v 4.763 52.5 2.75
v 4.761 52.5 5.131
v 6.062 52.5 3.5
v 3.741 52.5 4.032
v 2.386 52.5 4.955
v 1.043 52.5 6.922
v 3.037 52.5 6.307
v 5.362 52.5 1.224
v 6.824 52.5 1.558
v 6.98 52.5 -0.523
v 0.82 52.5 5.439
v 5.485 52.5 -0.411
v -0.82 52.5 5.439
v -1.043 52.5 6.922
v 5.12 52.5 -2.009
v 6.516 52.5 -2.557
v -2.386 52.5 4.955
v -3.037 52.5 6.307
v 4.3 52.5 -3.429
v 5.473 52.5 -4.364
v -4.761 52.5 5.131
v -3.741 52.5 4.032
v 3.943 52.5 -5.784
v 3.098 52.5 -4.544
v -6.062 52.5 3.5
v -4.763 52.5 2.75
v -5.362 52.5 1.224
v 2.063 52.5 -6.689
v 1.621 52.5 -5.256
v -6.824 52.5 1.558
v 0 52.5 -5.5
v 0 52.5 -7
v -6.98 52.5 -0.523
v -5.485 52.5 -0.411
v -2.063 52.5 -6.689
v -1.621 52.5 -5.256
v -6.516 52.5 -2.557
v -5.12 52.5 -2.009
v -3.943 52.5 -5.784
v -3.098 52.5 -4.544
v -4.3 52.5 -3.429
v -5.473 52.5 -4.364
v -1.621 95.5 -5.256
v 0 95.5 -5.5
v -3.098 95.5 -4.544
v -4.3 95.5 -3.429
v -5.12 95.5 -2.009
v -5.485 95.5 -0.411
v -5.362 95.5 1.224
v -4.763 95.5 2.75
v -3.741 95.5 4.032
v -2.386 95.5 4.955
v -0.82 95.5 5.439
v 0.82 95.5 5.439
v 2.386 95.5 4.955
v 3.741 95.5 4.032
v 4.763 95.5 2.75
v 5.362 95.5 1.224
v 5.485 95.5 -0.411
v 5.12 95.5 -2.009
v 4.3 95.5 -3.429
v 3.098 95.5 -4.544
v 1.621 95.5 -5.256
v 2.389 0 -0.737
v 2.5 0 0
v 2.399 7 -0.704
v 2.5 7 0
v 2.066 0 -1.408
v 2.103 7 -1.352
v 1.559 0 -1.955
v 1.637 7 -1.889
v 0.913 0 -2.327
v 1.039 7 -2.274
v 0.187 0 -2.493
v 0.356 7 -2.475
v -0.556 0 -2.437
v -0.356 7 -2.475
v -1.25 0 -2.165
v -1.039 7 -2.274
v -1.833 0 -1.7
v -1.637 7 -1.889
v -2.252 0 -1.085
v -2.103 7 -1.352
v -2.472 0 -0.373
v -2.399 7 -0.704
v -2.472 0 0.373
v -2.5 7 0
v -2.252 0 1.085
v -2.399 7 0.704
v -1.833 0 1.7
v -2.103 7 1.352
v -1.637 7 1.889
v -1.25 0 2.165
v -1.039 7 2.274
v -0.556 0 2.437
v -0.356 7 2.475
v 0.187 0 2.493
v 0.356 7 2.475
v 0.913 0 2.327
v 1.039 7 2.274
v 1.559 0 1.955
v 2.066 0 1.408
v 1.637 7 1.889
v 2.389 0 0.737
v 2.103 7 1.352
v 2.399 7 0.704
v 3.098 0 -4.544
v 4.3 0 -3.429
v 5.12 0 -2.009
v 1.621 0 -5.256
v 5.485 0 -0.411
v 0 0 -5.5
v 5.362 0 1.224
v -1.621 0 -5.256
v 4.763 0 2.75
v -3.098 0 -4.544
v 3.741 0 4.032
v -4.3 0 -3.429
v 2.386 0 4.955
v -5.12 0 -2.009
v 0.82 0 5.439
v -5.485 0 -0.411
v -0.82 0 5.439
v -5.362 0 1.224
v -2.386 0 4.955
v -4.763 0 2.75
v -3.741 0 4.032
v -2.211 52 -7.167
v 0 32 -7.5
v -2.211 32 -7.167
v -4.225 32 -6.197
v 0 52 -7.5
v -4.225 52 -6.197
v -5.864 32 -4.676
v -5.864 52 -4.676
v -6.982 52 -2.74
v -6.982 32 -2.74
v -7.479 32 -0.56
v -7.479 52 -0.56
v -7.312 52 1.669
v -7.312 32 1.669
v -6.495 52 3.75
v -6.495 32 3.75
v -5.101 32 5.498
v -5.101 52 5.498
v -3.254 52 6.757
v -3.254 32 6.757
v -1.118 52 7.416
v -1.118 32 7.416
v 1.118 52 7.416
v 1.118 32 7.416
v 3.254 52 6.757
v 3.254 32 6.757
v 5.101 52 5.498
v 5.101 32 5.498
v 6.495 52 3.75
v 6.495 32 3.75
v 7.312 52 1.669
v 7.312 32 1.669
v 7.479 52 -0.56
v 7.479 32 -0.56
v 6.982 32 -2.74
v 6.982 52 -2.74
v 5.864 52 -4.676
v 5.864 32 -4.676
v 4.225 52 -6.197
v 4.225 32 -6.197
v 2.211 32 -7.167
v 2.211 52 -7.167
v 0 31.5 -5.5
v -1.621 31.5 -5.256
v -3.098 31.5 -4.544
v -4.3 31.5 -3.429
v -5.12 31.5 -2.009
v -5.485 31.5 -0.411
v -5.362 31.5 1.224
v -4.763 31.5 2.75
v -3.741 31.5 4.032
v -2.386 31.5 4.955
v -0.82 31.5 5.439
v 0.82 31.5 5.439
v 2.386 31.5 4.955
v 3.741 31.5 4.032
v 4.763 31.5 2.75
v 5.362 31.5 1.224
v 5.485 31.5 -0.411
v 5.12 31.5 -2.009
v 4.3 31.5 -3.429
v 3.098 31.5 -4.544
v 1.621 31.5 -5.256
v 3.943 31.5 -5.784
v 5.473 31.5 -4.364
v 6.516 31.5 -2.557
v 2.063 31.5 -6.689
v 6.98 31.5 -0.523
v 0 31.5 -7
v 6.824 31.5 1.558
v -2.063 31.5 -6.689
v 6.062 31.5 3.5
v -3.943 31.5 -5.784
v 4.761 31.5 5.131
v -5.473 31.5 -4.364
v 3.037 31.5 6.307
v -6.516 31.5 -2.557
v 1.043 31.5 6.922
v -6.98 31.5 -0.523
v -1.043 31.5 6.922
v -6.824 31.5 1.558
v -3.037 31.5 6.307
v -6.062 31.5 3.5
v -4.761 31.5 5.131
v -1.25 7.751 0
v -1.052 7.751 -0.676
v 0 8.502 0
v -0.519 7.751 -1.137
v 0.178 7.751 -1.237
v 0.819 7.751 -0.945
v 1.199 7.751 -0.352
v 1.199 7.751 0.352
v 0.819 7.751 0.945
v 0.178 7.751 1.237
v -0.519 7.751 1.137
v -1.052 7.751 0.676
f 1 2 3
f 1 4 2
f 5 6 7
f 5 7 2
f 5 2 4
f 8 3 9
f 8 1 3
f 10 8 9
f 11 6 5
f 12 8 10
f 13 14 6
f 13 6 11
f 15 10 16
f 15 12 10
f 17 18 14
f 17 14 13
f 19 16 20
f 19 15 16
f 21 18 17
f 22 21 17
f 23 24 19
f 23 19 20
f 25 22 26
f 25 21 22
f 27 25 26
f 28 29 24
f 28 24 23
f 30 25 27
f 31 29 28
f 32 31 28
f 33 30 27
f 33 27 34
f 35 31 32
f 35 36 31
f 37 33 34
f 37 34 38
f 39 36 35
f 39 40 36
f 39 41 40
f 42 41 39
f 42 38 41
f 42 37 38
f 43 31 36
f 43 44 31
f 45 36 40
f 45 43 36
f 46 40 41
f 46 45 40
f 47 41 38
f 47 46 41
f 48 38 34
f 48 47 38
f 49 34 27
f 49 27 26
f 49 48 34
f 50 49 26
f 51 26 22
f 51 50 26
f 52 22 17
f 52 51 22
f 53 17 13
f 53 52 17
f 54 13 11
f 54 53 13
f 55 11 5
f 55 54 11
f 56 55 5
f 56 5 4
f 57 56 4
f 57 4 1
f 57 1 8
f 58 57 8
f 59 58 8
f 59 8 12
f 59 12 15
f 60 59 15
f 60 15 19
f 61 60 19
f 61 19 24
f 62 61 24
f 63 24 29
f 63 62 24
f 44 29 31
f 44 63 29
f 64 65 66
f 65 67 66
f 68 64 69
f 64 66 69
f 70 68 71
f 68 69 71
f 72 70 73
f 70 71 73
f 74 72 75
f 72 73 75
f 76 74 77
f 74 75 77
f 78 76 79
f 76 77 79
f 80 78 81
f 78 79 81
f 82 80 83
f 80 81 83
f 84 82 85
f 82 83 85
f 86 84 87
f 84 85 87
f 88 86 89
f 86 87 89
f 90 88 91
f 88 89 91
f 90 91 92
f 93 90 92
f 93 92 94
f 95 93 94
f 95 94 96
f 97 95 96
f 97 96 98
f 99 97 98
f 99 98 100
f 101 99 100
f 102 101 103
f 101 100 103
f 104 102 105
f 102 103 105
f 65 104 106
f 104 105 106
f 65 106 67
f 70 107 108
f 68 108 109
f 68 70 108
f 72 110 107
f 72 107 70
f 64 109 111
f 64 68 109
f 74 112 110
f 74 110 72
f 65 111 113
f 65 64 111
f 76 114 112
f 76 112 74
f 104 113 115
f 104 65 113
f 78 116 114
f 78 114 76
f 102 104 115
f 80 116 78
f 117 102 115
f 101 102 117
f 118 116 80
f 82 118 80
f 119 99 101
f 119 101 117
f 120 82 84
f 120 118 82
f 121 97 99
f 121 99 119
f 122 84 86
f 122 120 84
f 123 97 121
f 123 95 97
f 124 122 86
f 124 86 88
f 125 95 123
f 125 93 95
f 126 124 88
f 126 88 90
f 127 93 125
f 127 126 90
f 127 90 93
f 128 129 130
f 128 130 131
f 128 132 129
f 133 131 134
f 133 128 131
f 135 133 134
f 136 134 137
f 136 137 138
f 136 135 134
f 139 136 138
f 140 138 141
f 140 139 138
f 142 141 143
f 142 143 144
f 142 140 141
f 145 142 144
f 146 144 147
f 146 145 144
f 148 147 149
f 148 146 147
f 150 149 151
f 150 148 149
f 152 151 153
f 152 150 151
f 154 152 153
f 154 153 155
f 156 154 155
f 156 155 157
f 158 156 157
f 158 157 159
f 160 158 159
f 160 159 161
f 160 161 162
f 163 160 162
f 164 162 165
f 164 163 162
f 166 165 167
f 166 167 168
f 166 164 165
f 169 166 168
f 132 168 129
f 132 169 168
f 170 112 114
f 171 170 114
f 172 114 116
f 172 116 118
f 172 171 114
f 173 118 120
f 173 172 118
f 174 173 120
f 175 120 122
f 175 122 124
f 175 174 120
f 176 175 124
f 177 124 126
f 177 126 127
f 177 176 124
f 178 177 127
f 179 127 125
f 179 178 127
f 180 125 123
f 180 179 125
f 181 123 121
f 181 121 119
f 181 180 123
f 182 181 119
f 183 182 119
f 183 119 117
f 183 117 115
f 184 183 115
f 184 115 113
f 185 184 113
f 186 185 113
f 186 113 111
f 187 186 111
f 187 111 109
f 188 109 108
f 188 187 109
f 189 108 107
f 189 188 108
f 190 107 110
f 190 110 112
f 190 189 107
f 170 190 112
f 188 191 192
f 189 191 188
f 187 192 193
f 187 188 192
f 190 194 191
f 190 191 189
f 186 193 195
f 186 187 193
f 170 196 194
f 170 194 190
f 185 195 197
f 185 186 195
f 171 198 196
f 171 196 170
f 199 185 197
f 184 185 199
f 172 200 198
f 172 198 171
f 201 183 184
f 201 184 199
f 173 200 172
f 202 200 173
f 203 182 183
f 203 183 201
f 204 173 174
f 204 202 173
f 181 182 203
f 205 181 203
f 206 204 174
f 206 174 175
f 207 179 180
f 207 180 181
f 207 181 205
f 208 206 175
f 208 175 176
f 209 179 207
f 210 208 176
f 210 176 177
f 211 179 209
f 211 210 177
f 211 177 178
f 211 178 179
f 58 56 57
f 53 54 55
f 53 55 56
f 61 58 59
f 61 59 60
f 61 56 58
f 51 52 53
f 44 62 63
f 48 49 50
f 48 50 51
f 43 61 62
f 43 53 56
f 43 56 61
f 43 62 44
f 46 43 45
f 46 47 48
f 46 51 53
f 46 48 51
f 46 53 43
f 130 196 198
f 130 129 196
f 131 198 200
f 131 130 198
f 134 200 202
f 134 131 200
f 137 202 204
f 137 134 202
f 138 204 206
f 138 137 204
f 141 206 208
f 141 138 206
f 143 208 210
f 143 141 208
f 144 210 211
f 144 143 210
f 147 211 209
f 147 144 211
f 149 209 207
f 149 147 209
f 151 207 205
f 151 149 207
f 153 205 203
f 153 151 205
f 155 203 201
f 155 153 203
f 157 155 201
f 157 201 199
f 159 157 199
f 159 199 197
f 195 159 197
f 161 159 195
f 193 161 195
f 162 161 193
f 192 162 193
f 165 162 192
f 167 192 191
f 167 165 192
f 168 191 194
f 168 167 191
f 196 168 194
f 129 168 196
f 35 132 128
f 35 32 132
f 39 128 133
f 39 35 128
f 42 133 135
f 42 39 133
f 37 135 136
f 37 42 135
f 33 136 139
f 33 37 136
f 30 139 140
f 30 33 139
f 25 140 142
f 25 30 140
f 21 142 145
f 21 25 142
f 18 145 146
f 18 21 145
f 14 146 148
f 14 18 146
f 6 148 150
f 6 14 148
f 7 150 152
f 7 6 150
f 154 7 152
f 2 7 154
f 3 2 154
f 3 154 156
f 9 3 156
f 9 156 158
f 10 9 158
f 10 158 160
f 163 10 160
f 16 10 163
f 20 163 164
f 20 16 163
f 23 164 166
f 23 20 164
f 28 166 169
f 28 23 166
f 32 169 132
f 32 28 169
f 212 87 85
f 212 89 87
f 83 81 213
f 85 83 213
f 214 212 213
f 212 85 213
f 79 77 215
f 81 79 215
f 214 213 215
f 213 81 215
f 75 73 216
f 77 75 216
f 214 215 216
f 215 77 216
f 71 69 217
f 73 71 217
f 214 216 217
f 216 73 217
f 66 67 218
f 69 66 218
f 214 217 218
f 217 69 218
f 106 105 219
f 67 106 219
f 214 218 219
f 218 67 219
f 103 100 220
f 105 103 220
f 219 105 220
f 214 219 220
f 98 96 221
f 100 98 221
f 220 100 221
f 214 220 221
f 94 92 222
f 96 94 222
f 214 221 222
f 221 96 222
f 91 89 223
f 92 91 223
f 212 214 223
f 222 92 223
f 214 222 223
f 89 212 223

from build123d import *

# Parameters (mm, degrees)
M6X1_0_TAPPED_HOLE1_D     = 5
M6X1_0_TAPPED_HOLE1_DEPTH = 7
M6X1_0_TAPPED_HOLE1_TIP   = 1.502151548


with BuildPart() as part:
    # Sketch1 → Revolve1 (revolve)
    with BuildSketch(Plane.XY, mode=Mode.PRIVATE) as revolve1_sk:
        Polygon((0, 0), (5.5, 0), (5.5, 31.5), (7, 31.5), (7.5, 32), (7.5, 52), (7, 52.5), (5.5, 52.5), (5.5, 95.5), (0, 95.5), align=None)
    revolve(revolve1_sk.sketch.rotate(Axis((0, 0, 0), (0, 1, 0)), 90), axis=Axis((0, 0, 0), (0, 1, 0)))

    # M6x1.0 Tapped Hole1
    with Locations(Plane(origin=(0, 0, 0), x_dir=(-1, 0, 0), z_dir=(0, -1, 0))):
        with Locations((0, 0)):
            Hole(M6X1_0_TAPPED_HOLE1_D / 2, depth=M6X1_0_TAPPED_HOLE1_DEPTH)
            with Locations((0, 0, -(M6X1_0_TAPPED_HOLE1_DEPTH + M6X1_0_TAPPED_HOLE1_TIP / 2))):  # 118° drill point
                Cone(0, M6X1_0_TAPPED_HOLE1_D / 2, M6X1_0_TAPPED_HOLE1_TIP, mode=Mode.SUBTRACT)


solid = part.part
